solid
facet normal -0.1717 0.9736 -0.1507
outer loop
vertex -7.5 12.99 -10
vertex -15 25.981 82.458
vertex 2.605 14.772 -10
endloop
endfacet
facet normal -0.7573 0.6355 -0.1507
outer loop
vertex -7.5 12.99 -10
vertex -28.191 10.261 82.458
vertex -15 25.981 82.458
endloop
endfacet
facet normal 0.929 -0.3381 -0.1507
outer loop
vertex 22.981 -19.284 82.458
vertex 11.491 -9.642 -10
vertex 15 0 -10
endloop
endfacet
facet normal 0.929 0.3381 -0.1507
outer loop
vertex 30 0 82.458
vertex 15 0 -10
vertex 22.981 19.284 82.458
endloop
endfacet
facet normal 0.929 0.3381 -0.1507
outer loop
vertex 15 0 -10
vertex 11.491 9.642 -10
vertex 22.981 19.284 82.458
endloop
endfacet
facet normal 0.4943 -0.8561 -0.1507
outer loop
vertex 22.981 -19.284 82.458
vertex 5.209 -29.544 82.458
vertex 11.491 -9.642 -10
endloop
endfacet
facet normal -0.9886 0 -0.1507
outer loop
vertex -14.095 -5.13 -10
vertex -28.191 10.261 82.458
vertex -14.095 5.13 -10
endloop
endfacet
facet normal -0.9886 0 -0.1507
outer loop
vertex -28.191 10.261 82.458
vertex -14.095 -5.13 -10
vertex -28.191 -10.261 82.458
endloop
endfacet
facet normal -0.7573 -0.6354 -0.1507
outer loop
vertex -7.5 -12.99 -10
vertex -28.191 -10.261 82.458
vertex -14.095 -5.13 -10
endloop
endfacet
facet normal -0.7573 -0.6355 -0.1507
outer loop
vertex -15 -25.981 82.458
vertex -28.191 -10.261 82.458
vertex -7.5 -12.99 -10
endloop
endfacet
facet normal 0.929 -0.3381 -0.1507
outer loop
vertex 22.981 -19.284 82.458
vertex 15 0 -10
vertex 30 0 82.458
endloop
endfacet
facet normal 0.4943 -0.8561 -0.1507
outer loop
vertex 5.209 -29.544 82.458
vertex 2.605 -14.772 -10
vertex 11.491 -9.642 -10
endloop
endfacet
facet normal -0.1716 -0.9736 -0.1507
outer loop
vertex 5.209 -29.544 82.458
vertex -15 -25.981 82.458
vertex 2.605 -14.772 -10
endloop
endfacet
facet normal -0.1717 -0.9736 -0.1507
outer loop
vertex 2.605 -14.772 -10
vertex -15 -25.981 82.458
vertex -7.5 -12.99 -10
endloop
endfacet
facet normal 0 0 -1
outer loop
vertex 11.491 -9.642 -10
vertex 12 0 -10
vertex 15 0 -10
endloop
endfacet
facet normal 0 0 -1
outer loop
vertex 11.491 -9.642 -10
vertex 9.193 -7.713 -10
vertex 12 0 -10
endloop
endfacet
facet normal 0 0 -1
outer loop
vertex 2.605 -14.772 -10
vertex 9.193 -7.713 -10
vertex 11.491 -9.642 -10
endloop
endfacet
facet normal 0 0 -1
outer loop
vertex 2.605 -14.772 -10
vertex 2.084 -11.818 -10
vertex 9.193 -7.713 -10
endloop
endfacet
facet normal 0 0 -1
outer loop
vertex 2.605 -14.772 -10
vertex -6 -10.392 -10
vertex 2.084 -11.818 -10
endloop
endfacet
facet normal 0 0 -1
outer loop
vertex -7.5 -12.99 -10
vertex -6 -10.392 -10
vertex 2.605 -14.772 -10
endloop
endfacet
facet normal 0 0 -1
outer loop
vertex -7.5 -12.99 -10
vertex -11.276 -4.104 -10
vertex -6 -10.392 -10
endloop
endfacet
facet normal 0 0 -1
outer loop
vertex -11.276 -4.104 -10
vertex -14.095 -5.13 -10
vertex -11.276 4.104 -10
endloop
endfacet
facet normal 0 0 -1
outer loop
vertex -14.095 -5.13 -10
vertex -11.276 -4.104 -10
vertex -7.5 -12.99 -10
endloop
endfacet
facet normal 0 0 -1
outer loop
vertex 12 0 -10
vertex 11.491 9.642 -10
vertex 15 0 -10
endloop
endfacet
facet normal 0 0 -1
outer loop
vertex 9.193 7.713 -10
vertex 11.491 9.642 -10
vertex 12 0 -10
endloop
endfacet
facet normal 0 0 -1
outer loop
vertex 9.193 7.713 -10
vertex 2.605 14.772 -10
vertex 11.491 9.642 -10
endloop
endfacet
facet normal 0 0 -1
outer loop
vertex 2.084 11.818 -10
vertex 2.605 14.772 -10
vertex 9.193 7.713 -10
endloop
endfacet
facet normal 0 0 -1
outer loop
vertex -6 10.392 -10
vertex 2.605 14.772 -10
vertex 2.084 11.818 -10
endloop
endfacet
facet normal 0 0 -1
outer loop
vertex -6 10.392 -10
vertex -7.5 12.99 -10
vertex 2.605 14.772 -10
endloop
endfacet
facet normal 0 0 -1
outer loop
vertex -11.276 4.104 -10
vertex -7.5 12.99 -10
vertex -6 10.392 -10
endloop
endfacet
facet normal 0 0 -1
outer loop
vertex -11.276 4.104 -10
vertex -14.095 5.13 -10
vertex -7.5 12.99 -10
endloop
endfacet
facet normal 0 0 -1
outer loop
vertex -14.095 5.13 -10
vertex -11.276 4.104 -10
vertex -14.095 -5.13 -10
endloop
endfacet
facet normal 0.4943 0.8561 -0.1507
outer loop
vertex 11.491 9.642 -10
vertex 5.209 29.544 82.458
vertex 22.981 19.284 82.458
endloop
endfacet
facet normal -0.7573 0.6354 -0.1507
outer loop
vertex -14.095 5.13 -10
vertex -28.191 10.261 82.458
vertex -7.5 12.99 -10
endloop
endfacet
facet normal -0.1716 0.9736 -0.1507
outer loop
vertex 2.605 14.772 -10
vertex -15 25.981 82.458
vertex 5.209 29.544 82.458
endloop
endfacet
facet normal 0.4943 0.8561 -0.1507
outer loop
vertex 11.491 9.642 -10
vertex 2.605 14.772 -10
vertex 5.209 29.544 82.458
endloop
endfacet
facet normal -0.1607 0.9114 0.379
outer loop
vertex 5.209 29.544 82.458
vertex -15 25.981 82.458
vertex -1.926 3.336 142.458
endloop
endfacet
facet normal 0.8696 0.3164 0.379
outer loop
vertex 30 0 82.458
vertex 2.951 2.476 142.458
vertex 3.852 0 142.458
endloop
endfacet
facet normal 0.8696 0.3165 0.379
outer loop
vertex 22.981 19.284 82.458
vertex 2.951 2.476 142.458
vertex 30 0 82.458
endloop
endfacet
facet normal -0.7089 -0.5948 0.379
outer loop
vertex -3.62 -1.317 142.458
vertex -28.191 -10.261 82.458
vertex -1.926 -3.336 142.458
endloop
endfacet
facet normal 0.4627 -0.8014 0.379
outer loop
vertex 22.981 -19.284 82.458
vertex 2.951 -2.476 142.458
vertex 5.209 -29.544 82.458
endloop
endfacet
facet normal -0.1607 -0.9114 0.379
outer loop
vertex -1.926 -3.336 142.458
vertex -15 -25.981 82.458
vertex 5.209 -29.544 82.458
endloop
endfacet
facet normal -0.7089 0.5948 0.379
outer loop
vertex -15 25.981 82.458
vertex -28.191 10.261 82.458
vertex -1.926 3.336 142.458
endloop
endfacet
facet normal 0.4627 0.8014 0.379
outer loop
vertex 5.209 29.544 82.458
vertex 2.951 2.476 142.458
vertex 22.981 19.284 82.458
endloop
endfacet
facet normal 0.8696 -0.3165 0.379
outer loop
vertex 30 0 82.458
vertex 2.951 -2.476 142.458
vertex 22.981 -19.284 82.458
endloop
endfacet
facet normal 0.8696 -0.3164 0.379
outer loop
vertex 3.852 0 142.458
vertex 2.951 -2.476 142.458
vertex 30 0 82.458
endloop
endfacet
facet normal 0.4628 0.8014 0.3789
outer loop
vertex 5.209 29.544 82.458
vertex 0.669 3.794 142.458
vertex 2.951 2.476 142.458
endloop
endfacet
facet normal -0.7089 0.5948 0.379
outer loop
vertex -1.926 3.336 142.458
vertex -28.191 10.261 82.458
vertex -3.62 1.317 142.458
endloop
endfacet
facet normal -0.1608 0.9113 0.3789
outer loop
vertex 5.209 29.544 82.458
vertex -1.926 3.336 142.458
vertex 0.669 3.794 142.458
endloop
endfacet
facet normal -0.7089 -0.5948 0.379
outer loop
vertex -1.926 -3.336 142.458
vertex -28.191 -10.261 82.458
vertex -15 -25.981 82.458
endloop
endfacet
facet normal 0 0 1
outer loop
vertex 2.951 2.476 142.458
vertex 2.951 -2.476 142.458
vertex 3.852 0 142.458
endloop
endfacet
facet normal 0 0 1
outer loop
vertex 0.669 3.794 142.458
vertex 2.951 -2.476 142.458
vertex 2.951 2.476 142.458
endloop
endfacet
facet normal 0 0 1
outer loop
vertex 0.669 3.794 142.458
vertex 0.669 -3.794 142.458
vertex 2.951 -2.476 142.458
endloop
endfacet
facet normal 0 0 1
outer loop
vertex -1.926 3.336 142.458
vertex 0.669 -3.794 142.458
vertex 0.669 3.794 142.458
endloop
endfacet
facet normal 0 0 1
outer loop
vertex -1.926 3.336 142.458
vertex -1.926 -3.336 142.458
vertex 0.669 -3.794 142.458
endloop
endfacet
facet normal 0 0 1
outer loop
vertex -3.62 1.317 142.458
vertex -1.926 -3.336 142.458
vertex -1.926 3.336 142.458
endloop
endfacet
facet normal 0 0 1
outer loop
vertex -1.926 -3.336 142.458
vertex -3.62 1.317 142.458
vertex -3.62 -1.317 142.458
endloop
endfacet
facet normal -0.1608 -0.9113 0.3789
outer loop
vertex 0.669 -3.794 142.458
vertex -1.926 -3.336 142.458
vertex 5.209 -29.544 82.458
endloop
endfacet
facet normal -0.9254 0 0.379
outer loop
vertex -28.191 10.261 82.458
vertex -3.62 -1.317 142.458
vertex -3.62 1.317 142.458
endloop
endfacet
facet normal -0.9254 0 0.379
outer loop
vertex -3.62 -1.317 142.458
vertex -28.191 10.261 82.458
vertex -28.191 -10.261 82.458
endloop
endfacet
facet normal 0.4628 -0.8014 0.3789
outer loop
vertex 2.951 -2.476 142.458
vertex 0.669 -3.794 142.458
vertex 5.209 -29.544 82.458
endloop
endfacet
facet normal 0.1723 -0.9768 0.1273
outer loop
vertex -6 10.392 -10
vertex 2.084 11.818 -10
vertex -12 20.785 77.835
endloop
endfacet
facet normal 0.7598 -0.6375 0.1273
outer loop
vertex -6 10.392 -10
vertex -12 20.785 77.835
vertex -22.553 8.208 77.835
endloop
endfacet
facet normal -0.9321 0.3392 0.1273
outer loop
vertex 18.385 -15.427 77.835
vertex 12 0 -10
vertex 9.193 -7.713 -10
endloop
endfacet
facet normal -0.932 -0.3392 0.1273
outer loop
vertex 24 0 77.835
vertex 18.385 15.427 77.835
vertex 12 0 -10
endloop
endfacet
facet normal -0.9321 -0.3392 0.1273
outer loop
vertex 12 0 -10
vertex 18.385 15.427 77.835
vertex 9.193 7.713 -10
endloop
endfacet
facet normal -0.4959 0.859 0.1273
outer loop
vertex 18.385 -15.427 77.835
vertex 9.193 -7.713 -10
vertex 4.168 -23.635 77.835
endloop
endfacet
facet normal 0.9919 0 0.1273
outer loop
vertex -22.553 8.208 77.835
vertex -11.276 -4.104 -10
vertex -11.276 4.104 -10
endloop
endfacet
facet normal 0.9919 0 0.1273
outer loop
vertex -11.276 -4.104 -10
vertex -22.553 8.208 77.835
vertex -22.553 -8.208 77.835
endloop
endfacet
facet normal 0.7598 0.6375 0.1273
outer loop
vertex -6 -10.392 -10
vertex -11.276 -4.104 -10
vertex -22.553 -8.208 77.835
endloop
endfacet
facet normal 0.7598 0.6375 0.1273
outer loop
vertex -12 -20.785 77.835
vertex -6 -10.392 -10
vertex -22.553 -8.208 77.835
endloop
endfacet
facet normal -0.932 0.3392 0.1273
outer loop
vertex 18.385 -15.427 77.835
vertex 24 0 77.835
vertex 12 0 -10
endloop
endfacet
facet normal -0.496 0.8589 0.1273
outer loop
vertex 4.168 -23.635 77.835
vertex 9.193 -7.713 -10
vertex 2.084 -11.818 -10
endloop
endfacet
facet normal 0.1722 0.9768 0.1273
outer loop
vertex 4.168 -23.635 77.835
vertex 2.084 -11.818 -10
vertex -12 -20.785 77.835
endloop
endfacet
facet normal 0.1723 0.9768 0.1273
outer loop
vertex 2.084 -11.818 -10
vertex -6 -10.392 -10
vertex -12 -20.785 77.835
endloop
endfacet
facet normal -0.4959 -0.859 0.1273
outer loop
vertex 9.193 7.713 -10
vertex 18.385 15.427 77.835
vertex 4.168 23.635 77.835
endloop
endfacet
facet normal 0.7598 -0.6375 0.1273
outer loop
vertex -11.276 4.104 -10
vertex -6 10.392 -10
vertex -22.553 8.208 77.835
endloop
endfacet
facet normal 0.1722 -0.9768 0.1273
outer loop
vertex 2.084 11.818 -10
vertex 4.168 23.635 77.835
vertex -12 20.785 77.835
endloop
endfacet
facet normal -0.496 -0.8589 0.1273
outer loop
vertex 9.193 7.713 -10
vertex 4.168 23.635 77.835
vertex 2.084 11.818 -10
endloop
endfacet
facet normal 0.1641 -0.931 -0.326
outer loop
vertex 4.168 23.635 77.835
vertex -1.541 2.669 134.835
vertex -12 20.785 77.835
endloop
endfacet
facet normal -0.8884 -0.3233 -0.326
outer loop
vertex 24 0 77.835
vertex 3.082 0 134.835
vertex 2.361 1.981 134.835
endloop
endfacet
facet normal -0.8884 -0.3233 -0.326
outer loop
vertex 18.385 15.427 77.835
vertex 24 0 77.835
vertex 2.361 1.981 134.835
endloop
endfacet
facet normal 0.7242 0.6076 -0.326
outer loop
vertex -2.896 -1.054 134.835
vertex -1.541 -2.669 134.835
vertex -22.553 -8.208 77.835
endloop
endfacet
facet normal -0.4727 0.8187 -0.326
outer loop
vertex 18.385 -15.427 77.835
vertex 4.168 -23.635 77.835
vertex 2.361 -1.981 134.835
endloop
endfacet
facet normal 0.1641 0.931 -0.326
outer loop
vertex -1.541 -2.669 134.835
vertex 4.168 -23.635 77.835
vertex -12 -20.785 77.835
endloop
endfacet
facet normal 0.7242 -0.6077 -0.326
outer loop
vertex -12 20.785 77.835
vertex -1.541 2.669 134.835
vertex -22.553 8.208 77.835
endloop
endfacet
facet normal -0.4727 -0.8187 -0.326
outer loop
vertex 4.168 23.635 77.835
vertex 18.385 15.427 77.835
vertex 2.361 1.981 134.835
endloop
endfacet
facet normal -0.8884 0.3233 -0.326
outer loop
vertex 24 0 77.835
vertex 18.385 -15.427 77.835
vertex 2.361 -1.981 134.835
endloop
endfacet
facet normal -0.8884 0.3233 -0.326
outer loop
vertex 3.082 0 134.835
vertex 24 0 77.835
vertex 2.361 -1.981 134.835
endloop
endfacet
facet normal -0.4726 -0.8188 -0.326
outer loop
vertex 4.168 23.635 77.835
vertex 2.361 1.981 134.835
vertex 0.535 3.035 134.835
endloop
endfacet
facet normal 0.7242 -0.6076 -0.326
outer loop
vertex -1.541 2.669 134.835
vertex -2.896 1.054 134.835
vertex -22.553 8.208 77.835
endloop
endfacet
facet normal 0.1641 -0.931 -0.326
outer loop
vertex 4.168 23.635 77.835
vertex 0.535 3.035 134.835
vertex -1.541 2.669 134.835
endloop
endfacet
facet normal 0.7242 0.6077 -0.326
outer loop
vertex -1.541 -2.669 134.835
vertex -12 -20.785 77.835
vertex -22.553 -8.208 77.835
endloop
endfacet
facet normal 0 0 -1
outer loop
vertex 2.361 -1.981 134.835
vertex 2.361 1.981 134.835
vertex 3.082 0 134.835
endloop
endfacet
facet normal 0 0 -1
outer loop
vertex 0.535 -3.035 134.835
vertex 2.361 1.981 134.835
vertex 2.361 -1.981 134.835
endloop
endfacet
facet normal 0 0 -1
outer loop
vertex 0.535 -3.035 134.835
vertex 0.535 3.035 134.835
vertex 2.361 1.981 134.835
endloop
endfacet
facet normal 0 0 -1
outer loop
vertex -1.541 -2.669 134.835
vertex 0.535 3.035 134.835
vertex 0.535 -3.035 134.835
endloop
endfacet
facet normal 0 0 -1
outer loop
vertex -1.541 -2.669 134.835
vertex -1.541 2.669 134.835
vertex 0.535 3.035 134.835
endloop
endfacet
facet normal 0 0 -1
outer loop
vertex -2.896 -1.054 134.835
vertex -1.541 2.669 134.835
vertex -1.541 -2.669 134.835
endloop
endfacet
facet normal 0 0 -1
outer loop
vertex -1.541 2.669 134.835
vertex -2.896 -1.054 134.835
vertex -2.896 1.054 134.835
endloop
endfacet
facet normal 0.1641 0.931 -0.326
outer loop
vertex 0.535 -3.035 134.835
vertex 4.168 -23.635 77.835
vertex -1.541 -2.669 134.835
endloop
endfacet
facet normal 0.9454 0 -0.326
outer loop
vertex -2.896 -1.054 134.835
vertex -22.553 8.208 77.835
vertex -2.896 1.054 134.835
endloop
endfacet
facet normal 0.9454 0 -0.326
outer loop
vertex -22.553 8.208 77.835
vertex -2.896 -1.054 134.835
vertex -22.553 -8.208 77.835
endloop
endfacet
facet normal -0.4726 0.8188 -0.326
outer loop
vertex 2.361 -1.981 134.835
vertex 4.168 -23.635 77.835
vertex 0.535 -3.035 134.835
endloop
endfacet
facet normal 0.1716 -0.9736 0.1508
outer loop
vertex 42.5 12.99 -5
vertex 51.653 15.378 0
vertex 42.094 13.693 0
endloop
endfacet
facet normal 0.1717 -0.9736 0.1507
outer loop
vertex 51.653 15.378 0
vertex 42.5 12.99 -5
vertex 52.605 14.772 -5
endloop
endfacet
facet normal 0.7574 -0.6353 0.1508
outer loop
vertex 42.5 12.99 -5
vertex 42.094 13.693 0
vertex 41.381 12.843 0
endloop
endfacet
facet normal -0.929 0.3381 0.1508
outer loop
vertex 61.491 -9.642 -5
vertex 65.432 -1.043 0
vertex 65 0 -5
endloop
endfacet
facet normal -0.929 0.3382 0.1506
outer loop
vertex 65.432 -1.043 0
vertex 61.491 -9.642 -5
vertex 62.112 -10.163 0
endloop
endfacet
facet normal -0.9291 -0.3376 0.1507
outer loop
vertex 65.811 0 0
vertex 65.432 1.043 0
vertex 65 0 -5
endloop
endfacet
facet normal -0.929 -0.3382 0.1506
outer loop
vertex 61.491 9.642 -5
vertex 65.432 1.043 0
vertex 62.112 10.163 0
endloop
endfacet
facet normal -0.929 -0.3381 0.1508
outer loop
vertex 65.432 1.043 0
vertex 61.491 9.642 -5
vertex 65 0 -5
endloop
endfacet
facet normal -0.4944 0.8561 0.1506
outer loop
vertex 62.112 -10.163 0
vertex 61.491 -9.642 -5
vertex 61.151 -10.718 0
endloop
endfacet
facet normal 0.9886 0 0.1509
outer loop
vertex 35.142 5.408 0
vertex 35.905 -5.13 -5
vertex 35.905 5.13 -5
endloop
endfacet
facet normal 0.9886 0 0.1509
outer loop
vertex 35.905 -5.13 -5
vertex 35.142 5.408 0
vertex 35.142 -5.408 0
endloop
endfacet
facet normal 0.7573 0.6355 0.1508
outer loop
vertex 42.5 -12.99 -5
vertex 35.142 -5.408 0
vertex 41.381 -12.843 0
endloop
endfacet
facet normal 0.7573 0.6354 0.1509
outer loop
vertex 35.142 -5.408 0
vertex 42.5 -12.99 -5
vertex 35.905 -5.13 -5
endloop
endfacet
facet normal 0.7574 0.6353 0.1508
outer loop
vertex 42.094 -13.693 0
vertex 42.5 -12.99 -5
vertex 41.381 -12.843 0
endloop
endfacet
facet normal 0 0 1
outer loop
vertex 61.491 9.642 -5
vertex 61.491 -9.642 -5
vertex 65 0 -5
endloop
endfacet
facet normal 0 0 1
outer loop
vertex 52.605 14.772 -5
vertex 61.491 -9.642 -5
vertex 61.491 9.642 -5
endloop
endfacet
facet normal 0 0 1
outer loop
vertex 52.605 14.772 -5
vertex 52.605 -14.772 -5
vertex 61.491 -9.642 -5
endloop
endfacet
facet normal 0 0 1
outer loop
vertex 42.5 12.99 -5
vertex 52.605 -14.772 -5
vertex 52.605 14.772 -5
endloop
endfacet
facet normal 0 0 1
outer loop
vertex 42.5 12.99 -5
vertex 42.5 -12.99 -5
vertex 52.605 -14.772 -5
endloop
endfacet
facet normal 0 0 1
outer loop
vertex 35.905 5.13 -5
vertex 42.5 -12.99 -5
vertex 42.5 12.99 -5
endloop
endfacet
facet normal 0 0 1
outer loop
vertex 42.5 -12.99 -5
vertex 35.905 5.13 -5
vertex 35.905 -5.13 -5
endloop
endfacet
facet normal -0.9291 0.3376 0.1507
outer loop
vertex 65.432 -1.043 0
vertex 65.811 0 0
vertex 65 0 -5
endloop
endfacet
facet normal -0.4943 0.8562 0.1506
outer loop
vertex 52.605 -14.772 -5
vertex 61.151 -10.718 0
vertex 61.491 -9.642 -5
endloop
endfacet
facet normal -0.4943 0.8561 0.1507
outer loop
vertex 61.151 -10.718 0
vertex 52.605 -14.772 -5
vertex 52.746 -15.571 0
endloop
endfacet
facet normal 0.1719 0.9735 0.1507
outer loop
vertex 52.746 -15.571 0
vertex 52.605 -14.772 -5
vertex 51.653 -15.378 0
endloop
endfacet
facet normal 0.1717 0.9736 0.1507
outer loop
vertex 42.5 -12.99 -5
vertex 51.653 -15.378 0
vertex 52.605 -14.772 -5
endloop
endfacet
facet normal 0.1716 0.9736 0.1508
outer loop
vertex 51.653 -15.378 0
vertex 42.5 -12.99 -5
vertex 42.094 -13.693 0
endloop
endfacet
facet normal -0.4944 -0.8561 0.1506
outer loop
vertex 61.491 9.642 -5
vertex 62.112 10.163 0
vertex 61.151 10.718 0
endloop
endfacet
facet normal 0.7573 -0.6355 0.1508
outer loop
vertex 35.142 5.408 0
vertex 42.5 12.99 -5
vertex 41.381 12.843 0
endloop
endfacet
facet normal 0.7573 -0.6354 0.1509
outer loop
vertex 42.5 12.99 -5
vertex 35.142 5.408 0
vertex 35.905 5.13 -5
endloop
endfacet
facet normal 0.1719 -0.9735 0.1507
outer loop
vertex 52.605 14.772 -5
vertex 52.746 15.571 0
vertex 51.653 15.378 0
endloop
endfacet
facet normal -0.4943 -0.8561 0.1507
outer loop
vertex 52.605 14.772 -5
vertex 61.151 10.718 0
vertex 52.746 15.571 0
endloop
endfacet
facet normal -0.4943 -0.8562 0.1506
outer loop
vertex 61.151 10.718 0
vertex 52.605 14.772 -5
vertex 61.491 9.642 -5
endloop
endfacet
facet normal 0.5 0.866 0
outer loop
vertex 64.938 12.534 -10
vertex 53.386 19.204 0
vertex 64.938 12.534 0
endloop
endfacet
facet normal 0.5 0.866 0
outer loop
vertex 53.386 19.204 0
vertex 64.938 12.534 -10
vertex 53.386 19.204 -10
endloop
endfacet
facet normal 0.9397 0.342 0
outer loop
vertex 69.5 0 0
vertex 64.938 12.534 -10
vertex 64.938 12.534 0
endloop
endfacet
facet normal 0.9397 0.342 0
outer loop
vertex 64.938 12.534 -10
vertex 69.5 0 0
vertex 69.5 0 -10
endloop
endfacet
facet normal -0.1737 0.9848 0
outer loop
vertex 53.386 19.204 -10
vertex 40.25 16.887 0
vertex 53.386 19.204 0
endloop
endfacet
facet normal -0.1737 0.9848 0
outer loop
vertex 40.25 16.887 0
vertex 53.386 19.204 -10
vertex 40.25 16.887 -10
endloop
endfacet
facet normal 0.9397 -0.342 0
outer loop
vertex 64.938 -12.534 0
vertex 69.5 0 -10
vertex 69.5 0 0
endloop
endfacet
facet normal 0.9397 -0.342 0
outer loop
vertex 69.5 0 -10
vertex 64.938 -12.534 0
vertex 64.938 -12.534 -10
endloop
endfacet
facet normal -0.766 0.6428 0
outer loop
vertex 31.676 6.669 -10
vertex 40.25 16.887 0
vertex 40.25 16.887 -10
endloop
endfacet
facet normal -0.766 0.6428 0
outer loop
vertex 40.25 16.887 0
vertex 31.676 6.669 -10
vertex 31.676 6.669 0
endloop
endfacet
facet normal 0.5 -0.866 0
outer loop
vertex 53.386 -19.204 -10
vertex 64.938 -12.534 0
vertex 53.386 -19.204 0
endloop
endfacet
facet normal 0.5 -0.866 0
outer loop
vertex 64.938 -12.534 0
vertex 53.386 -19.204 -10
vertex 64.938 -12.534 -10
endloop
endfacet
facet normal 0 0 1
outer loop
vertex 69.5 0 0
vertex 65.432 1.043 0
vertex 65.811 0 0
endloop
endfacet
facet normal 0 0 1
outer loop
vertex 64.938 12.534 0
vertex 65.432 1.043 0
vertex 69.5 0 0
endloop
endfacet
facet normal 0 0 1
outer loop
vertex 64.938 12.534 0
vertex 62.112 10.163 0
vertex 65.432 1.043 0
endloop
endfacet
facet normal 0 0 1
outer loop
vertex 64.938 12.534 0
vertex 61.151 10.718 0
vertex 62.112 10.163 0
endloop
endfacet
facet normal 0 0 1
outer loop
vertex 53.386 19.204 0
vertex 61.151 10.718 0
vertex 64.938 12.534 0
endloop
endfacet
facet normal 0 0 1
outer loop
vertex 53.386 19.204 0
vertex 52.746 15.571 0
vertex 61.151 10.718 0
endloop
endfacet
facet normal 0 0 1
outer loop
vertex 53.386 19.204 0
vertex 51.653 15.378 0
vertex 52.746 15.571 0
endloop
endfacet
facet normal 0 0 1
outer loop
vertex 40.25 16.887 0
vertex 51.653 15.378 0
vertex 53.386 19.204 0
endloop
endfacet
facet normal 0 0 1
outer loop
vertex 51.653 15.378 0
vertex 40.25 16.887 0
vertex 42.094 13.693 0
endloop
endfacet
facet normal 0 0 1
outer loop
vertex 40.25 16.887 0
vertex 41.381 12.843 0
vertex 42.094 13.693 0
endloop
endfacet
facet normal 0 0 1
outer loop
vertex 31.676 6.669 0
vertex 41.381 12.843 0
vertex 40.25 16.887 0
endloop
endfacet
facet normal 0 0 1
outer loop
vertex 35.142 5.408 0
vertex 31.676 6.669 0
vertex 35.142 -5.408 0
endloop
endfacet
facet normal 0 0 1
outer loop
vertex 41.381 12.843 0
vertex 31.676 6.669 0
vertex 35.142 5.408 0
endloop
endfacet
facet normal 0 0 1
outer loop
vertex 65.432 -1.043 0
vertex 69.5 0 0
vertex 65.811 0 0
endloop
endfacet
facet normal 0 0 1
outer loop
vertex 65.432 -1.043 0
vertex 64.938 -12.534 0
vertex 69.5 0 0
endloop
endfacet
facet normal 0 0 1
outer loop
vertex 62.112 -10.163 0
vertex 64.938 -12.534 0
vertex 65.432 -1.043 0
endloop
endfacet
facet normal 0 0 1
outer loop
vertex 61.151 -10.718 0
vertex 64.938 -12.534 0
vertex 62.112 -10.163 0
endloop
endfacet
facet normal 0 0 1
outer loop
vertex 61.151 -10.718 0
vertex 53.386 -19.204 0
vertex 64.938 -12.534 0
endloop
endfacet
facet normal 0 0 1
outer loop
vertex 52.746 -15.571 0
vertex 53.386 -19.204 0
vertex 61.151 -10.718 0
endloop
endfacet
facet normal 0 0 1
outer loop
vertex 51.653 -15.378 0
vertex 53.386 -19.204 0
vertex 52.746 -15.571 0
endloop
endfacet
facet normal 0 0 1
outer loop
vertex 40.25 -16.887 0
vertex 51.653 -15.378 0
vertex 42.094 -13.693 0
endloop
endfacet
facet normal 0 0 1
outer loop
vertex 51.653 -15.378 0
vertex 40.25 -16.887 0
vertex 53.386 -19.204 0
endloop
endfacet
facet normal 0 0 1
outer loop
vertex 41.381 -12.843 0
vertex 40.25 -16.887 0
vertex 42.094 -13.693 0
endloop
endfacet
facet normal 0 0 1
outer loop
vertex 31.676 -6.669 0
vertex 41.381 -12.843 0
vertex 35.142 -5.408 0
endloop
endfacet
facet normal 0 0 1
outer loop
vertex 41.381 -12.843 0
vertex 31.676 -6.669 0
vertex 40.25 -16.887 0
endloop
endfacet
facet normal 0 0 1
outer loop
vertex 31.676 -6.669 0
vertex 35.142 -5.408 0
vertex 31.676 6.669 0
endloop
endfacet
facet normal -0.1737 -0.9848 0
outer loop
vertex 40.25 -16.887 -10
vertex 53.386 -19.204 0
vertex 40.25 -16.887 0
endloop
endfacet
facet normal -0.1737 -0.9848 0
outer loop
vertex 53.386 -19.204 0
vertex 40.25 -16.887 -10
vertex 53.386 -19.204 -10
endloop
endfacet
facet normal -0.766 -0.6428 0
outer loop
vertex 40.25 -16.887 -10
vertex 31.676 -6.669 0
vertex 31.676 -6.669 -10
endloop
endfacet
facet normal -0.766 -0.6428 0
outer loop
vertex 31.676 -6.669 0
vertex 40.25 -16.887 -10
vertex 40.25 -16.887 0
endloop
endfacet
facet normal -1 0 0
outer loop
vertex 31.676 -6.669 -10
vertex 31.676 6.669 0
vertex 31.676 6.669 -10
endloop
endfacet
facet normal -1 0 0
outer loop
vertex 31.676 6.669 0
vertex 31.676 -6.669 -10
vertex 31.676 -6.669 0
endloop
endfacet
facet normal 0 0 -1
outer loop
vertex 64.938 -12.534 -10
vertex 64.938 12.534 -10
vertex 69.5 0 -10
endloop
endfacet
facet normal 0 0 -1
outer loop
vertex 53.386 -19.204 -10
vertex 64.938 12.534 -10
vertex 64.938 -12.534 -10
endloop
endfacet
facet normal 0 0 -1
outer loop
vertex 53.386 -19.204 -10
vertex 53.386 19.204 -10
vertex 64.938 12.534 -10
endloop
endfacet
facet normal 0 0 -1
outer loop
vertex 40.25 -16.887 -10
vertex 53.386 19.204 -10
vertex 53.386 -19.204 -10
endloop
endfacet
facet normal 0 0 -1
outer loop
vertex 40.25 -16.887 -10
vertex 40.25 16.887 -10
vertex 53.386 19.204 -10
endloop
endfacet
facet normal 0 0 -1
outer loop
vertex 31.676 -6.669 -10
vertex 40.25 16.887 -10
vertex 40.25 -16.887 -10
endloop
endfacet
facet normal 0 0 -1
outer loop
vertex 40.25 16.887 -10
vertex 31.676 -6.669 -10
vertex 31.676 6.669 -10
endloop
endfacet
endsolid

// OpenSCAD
scale=30;
r_facets = rands(5,10,1)[0];
facets=r_facets;
r_height = rands(2,4,1)[0];
height=r_height;  
r_plane = rands(0,10,1)[0];
plane=r_plane;
r_top = rands(1,2,1)[0];
top=1;
r_cut = rands(0,20,1)[0];
cut=r_cut;
half=scale/1.5;
$fn=facets;

// Rock Generator
translate([0,0,-10]){
    difference(){
// Base model   
        union(){
            translate([0,0,0])
                cylinder(h=scale*height-cut,d1=scale,d2=half*3);
            translate([0,0,0+scale*height-cut])
                cylinder(h=(half*3)/top,d1=half*3,d2=plane);
        }
// Model which should be removed from the base model
        scale([0.8,0.8,0.95]){
            union(){
                translate([0,0,0])
                    cylinder(h=scale*height-cut,d1=scale,d2=half*3);
                translate([0,0,0+scale*height-cut])
                    cylinder(h=(half*3)/top,d1=half*3,d2=plane);
            }   
        }    
    }
}

// Socket
translate([50,0,-5]){
    difference(){
        cylinder(h=10,d1=scale*1.3,d2=scale*1.3, center= true);
            union(){
                translate([0,0,0])
                    cylinder(h=scale*height-cut,d1=scale,d2=half*3);
                translate([0,0,0+scale*height-cut])
                    cylinder(h=(half*3)/top,d1=half*3,d2=plane);
            }
    }
}
